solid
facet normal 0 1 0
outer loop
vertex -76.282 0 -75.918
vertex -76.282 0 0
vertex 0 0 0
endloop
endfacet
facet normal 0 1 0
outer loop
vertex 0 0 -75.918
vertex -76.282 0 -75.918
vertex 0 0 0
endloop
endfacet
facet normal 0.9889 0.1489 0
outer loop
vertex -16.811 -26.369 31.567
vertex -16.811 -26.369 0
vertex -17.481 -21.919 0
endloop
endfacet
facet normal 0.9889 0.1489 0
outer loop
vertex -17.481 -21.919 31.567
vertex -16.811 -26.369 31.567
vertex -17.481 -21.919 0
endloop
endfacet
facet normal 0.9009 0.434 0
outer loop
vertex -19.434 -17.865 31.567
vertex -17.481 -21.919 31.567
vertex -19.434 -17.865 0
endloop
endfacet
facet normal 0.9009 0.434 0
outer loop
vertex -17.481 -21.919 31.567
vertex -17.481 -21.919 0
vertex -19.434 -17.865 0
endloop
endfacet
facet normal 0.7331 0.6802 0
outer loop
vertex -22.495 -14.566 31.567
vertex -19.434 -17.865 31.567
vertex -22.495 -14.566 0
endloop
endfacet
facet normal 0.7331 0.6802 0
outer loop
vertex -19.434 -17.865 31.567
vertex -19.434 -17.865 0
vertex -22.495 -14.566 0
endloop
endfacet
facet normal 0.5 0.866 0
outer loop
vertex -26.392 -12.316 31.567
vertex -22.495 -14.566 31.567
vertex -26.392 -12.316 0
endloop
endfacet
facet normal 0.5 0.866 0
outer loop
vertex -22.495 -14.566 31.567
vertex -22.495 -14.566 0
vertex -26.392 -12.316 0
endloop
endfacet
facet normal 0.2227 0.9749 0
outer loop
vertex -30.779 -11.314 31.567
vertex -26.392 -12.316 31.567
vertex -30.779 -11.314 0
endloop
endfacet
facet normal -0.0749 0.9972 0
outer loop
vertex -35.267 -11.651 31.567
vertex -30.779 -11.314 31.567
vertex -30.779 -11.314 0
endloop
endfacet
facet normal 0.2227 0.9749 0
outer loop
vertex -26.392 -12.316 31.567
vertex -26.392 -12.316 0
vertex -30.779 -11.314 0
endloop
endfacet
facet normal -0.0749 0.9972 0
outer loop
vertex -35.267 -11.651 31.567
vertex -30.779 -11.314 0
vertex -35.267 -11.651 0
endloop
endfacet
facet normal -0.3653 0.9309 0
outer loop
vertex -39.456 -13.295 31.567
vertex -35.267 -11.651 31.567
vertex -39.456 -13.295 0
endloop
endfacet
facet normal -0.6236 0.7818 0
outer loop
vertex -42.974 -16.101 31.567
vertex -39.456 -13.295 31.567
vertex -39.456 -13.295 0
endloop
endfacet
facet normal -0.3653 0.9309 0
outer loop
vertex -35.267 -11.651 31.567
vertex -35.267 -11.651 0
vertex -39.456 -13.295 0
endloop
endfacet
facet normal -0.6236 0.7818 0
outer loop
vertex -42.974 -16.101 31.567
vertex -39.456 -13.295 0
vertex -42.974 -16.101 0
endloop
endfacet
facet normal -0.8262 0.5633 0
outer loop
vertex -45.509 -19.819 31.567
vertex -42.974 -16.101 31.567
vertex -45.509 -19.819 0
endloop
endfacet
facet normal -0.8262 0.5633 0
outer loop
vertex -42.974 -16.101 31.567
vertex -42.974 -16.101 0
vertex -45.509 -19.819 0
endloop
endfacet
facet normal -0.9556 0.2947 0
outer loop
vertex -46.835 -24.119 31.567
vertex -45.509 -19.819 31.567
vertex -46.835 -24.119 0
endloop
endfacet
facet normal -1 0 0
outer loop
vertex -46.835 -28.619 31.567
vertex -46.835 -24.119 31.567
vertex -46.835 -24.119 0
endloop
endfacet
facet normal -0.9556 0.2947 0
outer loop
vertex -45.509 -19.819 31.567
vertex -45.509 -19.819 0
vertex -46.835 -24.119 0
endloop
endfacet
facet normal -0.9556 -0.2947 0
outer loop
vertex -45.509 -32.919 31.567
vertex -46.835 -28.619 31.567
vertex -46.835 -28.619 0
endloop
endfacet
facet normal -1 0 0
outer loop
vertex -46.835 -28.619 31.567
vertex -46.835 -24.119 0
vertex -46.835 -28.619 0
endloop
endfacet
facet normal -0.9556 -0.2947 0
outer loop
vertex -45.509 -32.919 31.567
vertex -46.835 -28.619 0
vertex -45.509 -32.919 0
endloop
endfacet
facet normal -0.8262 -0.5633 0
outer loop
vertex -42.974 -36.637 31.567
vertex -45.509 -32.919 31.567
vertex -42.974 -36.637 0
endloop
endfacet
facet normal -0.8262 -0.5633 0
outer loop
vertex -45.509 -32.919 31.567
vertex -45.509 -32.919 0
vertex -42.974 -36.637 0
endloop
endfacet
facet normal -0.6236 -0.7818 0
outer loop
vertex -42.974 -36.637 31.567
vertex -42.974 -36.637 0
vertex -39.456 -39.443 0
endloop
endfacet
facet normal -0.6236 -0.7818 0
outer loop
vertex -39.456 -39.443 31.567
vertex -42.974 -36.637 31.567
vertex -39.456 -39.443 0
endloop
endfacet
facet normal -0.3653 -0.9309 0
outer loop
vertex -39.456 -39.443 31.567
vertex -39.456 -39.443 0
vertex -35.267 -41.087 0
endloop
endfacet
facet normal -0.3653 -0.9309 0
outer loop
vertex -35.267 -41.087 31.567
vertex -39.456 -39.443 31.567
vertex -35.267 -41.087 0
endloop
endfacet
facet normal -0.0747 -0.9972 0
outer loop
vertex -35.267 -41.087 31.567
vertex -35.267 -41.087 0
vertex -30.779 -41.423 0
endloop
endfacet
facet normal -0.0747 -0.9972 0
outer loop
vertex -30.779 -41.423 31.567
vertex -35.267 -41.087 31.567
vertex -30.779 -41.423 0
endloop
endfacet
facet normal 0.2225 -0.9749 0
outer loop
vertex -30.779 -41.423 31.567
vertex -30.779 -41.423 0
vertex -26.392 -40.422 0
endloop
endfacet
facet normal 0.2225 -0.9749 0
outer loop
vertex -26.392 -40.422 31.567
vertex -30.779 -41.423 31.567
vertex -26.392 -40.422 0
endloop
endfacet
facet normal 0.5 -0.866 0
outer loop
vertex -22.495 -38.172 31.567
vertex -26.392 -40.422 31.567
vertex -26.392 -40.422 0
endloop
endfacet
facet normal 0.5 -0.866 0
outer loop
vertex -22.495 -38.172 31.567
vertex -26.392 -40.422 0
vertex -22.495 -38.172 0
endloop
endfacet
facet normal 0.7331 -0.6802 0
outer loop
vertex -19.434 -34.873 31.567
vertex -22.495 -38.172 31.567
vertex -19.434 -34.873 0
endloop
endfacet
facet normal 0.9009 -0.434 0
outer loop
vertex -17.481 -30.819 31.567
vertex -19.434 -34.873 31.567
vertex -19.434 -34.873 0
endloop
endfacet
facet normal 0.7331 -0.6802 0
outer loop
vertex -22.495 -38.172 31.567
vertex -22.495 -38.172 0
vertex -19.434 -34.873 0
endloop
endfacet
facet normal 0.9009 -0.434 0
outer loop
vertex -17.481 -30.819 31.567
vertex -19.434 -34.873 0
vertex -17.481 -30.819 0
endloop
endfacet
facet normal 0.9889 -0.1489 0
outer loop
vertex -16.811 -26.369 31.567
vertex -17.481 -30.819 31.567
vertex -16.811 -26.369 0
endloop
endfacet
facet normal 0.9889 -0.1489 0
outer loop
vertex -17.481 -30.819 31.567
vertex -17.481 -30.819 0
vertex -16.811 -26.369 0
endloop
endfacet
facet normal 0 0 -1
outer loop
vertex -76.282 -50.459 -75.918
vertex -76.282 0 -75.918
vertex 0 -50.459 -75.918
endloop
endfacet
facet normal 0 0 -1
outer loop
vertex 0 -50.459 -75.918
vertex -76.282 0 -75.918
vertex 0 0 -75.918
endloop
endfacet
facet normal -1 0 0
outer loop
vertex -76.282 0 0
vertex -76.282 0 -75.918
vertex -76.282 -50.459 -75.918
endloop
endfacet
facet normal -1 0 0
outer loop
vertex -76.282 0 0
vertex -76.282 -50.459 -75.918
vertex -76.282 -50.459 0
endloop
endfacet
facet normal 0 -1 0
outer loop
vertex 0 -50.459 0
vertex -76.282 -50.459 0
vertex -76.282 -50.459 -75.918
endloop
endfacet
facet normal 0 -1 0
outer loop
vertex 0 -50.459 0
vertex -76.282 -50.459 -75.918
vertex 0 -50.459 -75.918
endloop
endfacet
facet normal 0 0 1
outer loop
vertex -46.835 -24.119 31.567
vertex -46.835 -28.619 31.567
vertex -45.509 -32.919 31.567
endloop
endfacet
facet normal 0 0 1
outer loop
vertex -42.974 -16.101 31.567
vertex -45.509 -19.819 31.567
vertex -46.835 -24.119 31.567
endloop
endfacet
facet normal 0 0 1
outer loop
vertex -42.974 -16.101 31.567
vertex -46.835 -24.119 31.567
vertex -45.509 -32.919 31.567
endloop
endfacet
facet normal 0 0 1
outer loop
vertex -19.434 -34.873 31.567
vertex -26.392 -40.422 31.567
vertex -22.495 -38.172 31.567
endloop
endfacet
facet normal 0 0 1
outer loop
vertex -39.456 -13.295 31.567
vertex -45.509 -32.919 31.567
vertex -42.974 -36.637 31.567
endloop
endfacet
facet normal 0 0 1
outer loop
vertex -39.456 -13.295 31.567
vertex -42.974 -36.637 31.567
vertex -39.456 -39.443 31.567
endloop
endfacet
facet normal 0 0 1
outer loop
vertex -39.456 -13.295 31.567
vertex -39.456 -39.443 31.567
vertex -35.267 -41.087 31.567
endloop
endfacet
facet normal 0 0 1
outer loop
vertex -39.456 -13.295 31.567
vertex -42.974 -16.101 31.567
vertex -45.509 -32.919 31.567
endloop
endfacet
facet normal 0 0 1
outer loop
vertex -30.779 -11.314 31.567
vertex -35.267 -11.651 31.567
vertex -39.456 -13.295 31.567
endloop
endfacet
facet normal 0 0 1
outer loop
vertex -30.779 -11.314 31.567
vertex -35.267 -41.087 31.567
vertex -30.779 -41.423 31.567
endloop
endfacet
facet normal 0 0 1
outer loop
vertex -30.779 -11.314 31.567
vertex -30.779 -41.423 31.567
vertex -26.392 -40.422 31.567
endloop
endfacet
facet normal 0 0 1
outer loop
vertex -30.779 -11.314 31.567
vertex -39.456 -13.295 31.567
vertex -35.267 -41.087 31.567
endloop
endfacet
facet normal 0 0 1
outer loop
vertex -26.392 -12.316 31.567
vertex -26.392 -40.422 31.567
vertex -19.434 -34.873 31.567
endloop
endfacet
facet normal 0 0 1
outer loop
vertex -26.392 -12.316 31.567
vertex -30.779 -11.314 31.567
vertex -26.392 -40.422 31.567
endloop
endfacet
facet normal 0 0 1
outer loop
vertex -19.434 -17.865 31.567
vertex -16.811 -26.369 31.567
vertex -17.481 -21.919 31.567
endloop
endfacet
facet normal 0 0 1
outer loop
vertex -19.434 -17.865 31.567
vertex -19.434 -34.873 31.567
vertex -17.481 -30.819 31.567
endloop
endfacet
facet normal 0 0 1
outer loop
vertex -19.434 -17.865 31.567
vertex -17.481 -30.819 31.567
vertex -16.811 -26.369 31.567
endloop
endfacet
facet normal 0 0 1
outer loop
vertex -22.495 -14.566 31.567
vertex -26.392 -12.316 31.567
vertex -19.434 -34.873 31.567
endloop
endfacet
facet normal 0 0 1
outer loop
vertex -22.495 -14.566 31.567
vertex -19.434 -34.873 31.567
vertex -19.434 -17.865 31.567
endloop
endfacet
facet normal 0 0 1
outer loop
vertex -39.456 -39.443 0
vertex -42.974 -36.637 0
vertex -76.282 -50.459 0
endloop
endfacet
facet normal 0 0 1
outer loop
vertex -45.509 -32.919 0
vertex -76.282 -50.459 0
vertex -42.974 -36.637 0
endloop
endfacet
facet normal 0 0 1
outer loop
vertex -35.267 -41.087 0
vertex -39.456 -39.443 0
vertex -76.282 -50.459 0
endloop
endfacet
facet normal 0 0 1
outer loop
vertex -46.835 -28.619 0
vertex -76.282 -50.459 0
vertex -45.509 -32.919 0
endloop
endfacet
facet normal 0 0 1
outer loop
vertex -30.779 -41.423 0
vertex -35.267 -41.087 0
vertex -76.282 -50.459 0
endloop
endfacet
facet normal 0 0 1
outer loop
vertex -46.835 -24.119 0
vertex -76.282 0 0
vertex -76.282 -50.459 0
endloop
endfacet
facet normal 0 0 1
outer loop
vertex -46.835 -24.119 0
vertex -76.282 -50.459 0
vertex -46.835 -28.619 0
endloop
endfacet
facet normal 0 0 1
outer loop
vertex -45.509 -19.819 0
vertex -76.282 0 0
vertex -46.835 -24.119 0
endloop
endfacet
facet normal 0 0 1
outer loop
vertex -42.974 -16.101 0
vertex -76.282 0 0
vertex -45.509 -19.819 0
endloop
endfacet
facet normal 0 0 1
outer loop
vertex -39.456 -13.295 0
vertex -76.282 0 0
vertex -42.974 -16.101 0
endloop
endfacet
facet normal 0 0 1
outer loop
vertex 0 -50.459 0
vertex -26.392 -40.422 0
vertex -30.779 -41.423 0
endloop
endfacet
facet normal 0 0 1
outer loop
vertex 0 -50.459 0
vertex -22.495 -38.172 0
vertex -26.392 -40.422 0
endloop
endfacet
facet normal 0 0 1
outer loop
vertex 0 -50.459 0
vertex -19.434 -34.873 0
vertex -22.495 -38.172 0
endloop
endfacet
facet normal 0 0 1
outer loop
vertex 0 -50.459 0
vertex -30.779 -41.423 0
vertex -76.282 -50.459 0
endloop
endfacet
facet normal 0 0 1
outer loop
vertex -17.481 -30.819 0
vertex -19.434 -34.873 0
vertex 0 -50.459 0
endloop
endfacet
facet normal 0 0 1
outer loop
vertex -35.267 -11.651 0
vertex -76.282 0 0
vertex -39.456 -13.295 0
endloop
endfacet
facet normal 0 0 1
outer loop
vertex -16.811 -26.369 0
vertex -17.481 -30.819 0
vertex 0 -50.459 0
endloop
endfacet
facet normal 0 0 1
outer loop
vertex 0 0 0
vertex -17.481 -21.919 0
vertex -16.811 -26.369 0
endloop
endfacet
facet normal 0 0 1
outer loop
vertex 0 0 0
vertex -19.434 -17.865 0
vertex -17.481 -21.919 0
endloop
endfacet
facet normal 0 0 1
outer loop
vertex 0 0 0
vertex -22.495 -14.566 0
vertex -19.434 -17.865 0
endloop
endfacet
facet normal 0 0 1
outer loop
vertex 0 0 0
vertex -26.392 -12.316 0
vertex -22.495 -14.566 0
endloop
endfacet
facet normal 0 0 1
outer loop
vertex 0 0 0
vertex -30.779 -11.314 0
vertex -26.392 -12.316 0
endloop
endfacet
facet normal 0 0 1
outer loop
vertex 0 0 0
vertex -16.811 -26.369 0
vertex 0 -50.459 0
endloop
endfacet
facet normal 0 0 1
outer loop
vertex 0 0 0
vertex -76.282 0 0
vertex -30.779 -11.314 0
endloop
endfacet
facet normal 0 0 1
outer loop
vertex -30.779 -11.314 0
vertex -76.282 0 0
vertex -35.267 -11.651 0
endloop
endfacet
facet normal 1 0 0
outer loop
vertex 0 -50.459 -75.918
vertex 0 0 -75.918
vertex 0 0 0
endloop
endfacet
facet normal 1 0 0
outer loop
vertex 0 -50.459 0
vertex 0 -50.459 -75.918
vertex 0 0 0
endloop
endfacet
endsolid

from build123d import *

# Parameters (mm, degrees)
F0_W     = 76.282457
F0_H     = 75.917773
F1_DEPTH = 50.45855
F2_R     = 15.096722
F3_DEPTH = 31.567339


with BuildPart() as f1:
    # F0 (on Front) → F1 (new body)
    with BuildSketch(Plane.XZ):
        with Locations((-38.141228, -37.958886)):
            Rectangle(F0_W, F0_H)
    extrude(amount=F1_DEPTH)

    # F2 (on face) → F3 (join)
    with BuildSketch(Plane.XY):
        with Locations((-31.907231, -26.368879)):
            Circle(F2_R)
    extrude(amount=F3_DEPTH)


solid = f1.part
